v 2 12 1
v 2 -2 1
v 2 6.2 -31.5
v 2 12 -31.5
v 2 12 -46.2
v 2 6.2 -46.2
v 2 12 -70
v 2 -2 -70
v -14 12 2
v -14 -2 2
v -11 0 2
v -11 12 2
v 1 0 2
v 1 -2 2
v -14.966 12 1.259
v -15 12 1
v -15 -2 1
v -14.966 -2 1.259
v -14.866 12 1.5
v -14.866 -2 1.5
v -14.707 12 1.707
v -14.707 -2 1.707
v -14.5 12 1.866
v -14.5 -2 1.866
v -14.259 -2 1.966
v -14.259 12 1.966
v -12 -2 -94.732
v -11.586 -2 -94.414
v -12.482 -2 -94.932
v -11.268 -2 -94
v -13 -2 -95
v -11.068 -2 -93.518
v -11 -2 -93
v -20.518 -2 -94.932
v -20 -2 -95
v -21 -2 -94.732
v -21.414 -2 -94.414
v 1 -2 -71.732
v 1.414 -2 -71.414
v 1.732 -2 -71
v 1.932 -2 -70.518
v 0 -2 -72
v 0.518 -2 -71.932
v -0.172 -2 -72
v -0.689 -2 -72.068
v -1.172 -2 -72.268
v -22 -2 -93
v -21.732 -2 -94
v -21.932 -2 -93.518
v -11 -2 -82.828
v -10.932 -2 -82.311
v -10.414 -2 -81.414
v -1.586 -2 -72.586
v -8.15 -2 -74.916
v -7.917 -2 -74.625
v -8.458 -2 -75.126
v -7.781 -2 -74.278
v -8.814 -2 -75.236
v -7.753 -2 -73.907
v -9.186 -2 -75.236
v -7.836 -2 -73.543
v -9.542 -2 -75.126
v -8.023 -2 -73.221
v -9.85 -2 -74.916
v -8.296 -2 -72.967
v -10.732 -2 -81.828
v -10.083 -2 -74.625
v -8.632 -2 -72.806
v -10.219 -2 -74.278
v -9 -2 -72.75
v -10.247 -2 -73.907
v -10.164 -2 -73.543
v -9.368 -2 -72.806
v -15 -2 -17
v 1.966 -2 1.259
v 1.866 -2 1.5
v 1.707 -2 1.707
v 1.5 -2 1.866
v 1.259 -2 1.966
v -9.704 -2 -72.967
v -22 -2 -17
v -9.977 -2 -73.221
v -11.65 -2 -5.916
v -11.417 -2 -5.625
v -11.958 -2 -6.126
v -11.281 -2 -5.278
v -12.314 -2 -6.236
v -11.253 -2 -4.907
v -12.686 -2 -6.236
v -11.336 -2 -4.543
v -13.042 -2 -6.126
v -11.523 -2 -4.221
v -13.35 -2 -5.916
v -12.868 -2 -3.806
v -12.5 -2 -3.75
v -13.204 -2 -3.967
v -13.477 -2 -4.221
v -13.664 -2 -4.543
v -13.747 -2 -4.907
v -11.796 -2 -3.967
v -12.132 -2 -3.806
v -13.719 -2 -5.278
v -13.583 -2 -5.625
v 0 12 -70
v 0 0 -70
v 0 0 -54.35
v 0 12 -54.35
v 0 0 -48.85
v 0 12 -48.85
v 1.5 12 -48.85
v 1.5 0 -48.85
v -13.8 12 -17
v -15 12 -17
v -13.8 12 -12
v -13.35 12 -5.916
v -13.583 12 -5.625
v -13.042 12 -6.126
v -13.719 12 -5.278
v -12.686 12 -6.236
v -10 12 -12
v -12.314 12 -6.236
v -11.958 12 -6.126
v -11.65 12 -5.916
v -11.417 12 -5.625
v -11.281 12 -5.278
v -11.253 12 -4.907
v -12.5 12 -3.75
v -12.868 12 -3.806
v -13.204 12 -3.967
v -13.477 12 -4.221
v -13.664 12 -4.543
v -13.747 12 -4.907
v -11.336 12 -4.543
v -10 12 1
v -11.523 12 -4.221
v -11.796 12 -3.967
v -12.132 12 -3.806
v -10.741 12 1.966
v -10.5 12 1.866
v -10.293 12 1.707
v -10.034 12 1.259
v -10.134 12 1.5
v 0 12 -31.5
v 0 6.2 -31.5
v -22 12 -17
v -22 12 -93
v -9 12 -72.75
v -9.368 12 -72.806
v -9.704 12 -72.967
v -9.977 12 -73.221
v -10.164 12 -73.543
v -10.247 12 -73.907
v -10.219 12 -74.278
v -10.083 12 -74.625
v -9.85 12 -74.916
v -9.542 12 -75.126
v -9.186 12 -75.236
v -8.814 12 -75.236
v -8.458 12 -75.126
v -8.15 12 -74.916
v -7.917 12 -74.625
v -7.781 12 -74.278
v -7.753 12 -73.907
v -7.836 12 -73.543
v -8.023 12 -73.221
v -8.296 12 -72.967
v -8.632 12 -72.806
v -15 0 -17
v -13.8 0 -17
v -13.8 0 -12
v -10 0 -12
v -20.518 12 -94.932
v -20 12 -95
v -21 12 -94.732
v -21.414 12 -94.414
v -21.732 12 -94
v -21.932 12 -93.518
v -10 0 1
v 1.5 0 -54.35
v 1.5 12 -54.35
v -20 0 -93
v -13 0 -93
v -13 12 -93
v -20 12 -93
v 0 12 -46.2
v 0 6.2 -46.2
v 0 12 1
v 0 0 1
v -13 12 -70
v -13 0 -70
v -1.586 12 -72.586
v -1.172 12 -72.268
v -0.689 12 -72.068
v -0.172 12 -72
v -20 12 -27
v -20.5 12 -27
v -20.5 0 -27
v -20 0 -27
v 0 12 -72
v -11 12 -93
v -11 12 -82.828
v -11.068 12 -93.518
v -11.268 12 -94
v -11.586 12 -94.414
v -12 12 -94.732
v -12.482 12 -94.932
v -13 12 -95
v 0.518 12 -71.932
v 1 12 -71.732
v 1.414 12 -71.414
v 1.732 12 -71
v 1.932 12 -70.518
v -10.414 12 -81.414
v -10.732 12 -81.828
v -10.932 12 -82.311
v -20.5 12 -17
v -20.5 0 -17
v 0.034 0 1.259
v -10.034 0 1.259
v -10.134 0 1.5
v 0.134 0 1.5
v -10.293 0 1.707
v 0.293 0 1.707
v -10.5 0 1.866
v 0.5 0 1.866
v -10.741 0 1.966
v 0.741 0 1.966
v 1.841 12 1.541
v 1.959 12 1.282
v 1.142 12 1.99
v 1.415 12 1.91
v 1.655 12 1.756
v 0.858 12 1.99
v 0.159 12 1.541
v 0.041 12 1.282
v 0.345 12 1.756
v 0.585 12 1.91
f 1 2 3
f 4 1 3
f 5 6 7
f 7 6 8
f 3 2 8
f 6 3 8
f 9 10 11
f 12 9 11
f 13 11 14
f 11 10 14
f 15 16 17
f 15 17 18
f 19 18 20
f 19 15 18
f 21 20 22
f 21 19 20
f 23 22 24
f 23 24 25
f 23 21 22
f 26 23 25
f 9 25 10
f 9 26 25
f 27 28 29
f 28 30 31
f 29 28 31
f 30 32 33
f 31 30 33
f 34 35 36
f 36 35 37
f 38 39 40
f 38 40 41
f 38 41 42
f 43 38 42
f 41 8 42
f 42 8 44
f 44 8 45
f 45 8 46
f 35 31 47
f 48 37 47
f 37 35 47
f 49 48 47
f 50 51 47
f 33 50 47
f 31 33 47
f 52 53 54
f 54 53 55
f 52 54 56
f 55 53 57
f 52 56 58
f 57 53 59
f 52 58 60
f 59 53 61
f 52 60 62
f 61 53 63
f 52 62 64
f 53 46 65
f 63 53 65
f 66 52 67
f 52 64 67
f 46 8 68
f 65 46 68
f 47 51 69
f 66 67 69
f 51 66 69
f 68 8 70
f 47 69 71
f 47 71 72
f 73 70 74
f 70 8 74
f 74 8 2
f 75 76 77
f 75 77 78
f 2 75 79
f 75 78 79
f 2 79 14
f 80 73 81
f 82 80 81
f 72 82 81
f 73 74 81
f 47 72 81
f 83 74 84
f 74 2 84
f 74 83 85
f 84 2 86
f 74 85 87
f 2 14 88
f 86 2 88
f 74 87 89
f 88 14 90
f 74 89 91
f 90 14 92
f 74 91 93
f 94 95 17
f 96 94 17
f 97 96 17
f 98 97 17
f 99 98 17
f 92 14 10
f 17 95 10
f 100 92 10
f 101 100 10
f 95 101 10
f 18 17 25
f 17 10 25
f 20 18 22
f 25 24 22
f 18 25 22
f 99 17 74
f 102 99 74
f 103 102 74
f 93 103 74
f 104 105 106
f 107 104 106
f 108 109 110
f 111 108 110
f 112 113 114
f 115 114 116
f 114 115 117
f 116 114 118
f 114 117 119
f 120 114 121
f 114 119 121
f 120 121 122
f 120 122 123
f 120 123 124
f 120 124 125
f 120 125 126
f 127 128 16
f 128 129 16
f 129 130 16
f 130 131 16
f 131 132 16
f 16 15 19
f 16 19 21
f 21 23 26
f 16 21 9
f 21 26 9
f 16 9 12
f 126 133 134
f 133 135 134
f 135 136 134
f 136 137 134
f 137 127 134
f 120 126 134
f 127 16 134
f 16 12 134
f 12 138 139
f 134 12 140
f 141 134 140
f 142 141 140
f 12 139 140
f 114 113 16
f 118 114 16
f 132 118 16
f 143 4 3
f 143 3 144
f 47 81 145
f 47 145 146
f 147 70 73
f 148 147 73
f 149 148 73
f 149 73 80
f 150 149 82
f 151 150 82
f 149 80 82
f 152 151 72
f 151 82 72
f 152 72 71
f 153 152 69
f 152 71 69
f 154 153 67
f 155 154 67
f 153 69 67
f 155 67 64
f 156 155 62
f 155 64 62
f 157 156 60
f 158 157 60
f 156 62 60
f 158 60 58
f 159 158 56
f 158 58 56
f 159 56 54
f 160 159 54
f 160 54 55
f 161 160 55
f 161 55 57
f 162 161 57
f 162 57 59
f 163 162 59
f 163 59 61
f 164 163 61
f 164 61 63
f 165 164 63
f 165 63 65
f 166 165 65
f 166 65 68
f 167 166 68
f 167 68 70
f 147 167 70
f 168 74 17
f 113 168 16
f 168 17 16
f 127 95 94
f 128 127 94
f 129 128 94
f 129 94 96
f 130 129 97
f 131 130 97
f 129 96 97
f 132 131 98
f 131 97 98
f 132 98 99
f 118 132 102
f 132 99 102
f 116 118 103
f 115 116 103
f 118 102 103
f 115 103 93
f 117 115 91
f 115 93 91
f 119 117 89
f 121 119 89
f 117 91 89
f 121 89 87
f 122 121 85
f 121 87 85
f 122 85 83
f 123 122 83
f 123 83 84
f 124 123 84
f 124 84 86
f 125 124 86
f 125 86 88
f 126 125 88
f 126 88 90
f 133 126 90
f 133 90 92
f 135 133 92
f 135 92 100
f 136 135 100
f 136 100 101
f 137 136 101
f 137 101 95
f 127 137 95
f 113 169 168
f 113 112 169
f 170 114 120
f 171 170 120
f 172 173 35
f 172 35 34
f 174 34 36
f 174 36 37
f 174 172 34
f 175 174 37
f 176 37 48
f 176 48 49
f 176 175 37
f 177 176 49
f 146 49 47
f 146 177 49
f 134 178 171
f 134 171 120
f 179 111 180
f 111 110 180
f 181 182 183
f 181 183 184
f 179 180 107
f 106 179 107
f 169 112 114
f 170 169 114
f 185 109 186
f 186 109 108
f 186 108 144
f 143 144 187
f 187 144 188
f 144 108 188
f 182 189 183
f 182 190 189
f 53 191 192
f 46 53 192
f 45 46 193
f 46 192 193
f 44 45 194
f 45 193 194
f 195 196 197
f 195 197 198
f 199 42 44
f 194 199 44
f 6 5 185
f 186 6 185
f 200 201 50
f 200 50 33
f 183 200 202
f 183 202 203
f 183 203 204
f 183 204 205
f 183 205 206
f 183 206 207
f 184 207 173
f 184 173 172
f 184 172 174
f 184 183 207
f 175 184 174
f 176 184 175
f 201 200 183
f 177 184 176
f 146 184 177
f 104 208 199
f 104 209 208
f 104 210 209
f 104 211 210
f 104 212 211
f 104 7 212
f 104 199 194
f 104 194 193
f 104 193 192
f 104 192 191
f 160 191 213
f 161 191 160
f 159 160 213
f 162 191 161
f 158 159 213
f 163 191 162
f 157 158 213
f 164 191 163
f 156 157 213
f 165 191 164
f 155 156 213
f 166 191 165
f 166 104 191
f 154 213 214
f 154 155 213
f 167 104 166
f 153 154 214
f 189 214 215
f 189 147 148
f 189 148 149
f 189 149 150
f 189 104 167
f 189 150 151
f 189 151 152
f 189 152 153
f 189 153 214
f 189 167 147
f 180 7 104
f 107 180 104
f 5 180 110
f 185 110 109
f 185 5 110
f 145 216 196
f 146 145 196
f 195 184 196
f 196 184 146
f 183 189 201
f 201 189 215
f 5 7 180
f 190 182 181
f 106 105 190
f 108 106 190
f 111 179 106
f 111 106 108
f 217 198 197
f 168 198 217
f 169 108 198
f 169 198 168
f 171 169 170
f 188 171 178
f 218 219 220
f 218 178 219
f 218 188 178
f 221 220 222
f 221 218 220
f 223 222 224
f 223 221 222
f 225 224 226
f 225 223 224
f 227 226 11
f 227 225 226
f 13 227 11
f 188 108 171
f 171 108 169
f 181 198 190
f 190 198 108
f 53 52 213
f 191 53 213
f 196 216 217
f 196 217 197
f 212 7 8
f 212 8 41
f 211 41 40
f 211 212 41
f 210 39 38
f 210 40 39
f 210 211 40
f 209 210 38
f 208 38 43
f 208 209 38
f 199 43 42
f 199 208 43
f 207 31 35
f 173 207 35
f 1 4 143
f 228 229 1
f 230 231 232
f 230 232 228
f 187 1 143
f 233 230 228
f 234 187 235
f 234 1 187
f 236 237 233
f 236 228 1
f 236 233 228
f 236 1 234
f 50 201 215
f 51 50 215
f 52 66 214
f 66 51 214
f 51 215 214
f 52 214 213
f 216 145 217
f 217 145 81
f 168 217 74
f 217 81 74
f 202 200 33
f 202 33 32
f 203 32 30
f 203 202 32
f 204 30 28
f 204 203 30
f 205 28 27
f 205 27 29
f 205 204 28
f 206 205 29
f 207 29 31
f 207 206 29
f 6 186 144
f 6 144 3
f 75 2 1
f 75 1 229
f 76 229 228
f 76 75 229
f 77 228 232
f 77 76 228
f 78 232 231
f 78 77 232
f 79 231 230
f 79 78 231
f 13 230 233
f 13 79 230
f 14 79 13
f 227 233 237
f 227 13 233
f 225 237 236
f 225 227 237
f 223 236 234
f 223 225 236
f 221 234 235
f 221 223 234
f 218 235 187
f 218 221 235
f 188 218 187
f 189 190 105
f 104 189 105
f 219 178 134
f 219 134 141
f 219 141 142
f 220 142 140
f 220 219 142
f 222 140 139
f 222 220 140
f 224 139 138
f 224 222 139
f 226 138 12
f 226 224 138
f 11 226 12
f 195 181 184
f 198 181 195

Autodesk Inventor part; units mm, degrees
ref_plane "YZ Plane" through (0, 0, 0) normal (1, 0, 0) x (0, 1, 0)
ref_plane "XZ Plane" through (0, 0, 0) normal (0, 1, 0) x (-1, 0, 0)
ref_plane "XY Plane" through (0, 0, 0) normal (0, 0, 1) x (1, 0, 0)
sketch "Skizze1" plane through (0, 0, 0) normal (0, 1, 0) x (-1, 0, 0)
  line L0 (0, 0) -> (10, 0)
  line L1 (20, -14) -> (20, -70)
  line L2 (13, -70) -> (0, -70)
  line L3 (0, -70) -> (0, 0)
  line L4 (20, -70) -> (13, -70)
  line L5 (13, -70) -> (13, -93)
  line L6 (13, -93) -> (20, -93)
  line L7 (20, -93) -> (20, -70)
  line L8 (20, 0) -> (10, 0)
  line L9 (10, 0) -> (10, -14)
  line L10 (10, -14) -> (20, -14)
  line L11 (20, -14) -> (20, 0)
  line L12 (20, -12) -> (12, -12)
  line L13 (12, -12) -> (12, 0)
  line L14 (10, 2) -> (-2, 2)
  line L15 (-2, 2) -> (-2, -72)
  line L16 (-2, -72) -> (13, -72)
  line L17 (11, -70) -> (11, -95)
  line L18 (11, -95) -> (22, -95)
  line L19 (22, -95) -> (22, -70)
  line L20 (10, 2) -> (12, 2)
  line L21 (12, 2) -> (12, 0)
  line L22 (20, -12) -> (22, -12)
  line L23 (22, -12) -> (22, -70)
  line L24 (10, 0) -> (10, 2)
  line L25 (0, 0) -> (0, 2)
  line L26 (10, -14) -> (20, -14)
  line L27 (20, -14) -> (20, -21)
  line L28 (20, -21) -> (10, -21)
  line L29 (10, -21) -> (10, -14)
  line L30 (12, -12) -> (12, -14)
  line L31 (20, -21) -> (22, -21)
  line L32 (20, -14) -> (22, -14)
  line L33 (12, 2) -> (15, 2)
  line L34 (15, 2) -> (15, -14)
  line L35 (15, -14) -> (12, -14)
  line L36 (12, -14) -> (12, 2)
  line L37 (10, -14) -> (15, -14)
  line L38 (15, -14) -> (15, -21)
  line L39 (15, -21) -> (10, -21)
  line L40 (10, -21) -> (10, -14)
  point P0 (11, -72)
  dimension "d0" = 20
  dimension "d1" = 70
  dimension "d2" = 7
  dimension "d3" = 23
  dimension "d4" = 10
  dimension "d5" = 14
  dimension "d6" = 2
  dimension "d7" = 2
  dimension "d8" = 2
  dimension "d13" = 7
extrude "Extrusion1" add sketch "Skizze1" along normal blind 12 contours L3 L2 L17 L16 L15 L14 L25 | L24 L20 L21 L8 | L8 L13 L30 L10 L9 | L21 L33 L34 L8 | L8 L34 L12 L13 | L2 L5 L16 L17 | L12 L34 L10 L30 | L16 L5 L6 L7 L1 L31 L23 L19 L18 L17 | L32 L23 L31 L1
extrude "Extrusion3" add sketch "Skizze1" against normal blind 2 contours L25 L14 L24 L0 | L0 L9 L29 L28 L1 L4 L2 L3 | L3 L2 L17 L16 L15 L14 L25 | L24 L20 L21 L8 | L8 L13 L30 L10 L9 | L21 L33 L34 L8 | L8 L34 L12 L13 | L10 L38 L28 L29 | L2 L5 L16 L17 | L12 L34 L10 L30 | L4 L7 L6 L5 | L16 L5 L6 L7 L1 L31 L23 L19 L18 L17 | L10 L1 L28 L38 | L32 L23 L31 L1
chamfer "Fase1" distance 10 angle 45 1 edges at (-11, 5, -72)
fillet "Rundung1" radius 2 2 edges at (2, 5, -72) (-11, 5, -82)
fillet "Rundung2" radius 2 1 edges at (-1, 5, -72)
fillet "Rundung3" radius 2 2 edges at (-11, 5, -95) (-22, 5, -95)
fillet "Rundung4" radius 1 4 edges at (2, 5, 2) (0, 6, 2) (-10, 6, 2) (-15, 5, 2)
sketch "Skizze4" plane through (0, 12, 0) normal (0, 1, 0) x (1, 0, 0)
  line L0 (-13, 70) -> (0, 70) projected
  line L1 (2, -1) -> (2, 70) projected
  line L2 (0, 70) -> (2, 70)
  line L3 (2, 70) -> (2, 46.2)
  line L4 (2, 46.2) -> (0, 46.2)
  line L5 (0, 46.2) -> (0, 70)
  line L6 (0, 46.2) -> (2, 46.2)
  line L7 (2, 46.2) -> (2, 31.5)
  line L8 (2, 31.5) -> (0, 31.5)
  line L9 (0, 31.5) -> (0, 46.2)
  line L10 (0, 72) -> (-0.1716, 72) projected
  point P0 (0, 0)
  point P1 (2, 31.5)
  dimension "d24" = 14.7
  dimension "d56" = 23.8
extrude "Extrusion4" cut sketch "Skizze4" against normal blind 5.8 contours L8 L9 L4 L1
fillet "Rundung5" radius 1 1 edges at (-22, 5, -14)
sketch "Skizze5" plane through (0, -2, 0) normal (0, -1, 0) x (1, 0, 0)
  line L0 (-10, -14) -> (-15, -14) projected
  line L1 (-22, -15) -> (-22, -93) projected
  line L2 (-15, -14) -> (-22, -14)
  line L3 (-22, -14) -> (-22, -17)
  line L4 (-22, -17) -> (-15, -17)
  line L5 (-15, -17) -> (-15, -14)
  point P0 (0, 0)
  dimension "d28" = 3
extrude "Extrusion5" cut sketch "Skizze5" against normal through all
sketch "Skizze6" plane through (-10, 12, -14) normal (0, 0, -1) x (-1, 0, 0)
  line L0 (0, -12) -> (0, 0) projected
  line L1 (5, -12) -> (5, 0) projected
  line L2 (0, -12) -> (5, -12)
  line L3 (5, -12) -> (5, 0)
  line L4 (5, 0) -> (0, 0)
  line L5 (0, 0) -> (0, -12)
  point P0 (-10, -12)
extrude "Extrusion6" add sketch "Skizze6" along normal blind 3
sketch "Skizze7" plane through (0, 12, 0) normal (0, 1, 0) x (1, 0, 0)
  line L0 (-10, -1) -> (-10, 17) projected
  line L1 (-10, 17) -> (-13.8, 17)
  line L2 (-13.8, 17) -> (-13.8, 12)
  line L3 (-13.8, 12) -> (-10, 12)
  line L4 (-10, 12) -> (-10, 17)
  point P0 (0, 0)
  dimension "d34" = 5
  dimension "d35" = 3.8
extrude "Extrusion7" cut sketch "Skizze7" against normal up to surface (12 mm away)
sketch "Skizze8" plane through (0, 12, 0) normal (0, 1, 0) x (1, 0, 0)
  line L0 (-13, 70) -> (0, 70) projected
  line L1 (-13, 93) -> (-13, 70) projected
  point P0 (0, 0)
  point P1 (-9, 74)
  dimension "d38" = 4
  dimension "d39" = 4
hole "Bohrung1" at (-9, 12, -74) direction (0, -1, 0) diameter 2.5 end through all
sketch "Skizze9" plane through (0, 12, 0) normal (0, 1, 0) x (1, 0, 0)
  line L0 (-10, -1) -> (-10, 12) projected
  line L1 (-14, -2) -> (-11, -2) projected
  point P0 (0, 0)
  point P1 (-12.5, 5)
  dimension "d47" = 2.5
  dimension "d48" = 7
hole "Bohrung2" at (-12.5, 12, -5) direction (0, -1, 0) diameter 2.5 end through all
sketch "Skizze10" plane through (0, 12, 0) normal (0, 1, 0) x (1, 0, 0)
  line L0 (0, 70) -> (0, 46.2) projected
  line L1 (0, 48.85) -> (1.5, 48.85)
  line L2 (1.5, 48.85) -> (1.5, 54.35)
  line L3 (1.5, 54.35) -> (0, 54.35)
  line L4 (0, 54.35) -> (0, 48.85)
  line L5 (-13, 70) -> (0, 70) projected
  point P0 (0, 0)
  point P1 (0, 54.35)
  dimension "d58" = 5.5
  dimension "d59" = 1.5
  dimension "d60" = 15.65
extrude "Extrusion8" cut sketch "Skizze10" against normal up to surface (12 mm away)
sketch "Skizze11" plane through (0, 12, 0) normal (0, 1, 0) x (1, 0, 0)
  line L0 (-20, 17) -> (-20, 93) projected
  line L1 (-20, 17) -> (-20.5, 17)
  line L2 (-20.5, 17) -> (-20.5, 27)
  line L3 (-20.5, 27) -> (-20, 27)
  line L4 (-20, 27) -> (-20, 17)
  point P0 (0, 0)
  dimension "d63" = 0.5
  dimension "d64" = 10
extrude "Extrusion9" cut sketch "Skizze11" against normal up to surface (12 mm away)
properties part number "Case_DIP"
